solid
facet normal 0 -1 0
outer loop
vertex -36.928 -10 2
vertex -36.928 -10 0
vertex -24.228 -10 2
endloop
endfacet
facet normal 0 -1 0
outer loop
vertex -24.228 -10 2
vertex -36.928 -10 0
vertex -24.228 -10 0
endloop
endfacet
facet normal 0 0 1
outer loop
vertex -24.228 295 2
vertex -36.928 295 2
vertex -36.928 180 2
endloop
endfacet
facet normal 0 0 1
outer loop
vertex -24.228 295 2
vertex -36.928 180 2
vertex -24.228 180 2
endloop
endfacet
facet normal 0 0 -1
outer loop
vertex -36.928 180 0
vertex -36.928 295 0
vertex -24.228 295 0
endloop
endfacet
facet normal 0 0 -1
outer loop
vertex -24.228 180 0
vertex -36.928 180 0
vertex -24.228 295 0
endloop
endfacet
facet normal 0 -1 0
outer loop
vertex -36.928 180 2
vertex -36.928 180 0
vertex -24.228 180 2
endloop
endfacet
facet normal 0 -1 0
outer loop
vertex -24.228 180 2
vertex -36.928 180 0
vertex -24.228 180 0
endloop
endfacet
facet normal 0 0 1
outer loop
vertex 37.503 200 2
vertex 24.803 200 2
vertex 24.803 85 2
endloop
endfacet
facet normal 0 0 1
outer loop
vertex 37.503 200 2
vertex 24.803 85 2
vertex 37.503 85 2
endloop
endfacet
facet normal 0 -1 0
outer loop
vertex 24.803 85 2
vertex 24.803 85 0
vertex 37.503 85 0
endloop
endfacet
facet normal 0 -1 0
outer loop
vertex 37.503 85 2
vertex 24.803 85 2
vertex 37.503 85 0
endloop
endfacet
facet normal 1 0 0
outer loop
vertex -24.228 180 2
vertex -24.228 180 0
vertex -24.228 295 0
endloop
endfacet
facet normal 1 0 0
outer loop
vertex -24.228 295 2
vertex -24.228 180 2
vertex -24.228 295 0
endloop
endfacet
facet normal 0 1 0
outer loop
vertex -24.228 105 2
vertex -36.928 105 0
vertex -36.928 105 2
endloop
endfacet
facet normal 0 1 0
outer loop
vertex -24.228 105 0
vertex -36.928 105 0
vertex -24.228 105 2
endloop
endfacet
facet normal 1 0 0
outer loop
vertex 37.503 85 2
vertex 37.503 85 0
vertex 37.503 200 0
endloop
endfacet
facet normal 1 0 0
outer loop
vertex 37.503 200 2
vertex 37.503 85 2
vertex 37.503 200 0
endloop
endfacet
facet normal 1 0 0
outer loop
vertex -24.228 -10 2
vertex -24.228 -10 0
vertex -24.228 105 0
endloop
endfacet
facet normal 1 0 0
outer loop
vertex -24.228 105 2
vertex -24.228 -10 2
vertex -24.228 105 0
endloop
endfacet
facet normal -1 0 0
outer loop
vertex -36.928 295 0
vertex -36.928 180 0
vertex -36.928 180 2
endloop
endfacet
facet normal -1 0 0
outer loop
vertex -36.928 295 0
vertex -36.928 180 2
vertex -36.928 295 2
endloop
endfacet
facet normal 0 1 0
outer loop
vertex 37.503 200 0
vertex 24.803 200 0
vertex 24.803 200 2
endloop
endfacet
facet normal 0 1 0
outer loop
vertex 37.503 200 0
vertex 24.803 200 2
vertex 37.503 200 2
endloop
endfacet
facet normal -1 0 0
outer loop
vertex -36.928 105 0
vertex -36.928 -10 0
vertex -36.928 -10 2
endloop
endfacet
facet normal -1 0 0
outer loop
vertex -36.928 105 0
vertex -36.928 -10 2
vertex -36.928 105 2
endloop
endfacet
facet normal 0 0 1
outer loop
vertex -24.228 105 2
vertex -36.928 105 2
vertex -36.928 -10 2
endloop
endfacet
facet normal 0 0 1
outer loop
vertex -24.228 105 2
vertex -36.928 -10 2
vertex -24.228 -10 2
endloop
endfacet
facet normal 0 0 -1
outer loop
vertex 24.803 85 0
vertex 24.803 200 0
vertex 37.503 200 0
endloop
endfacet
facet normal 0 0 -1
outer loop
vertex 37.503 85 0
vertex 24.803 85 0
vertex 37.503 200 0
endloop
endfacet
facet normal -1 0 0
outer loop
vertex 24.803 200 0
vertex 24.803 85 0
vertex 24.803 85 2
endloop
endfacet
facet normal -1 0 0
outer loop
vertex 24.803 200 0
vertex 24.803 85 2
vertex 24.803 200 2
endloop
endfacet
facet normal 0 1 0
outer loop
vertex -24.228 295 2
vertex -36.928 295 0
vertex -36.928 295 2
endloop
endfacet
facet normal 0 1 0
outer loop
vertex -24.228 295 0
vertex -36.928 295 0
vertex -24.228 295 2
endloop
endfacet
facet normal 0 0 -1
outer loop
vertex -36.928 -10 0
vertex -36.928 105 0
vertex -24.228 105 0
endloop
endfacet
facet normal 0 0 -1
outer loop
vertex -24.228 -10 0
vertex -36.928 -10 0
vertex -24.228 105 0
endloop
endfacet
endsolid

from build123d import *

# Parameters (mm, degrees)
SKETCH1_W             = 12.7
SKETCH1_H             = 115
BOSS_EXTRUDE1_DEPTH   = 2
BOSS_EXTRUDE1_2_DEPTH = 2
BOSS_EXTRUDE1_3_DEPTH = 2


with BuildPart() as part:
    # Sketch1 → Boss-Extrude1 (new body)
    with BuildSketch(Plane.XY):
        with Locations((-30.578112918, 47.5)):
            Rectangle(SKETCH1_W, SKETCH1_H)
    extrude(amount=BOSS_EXTRUDE1_DEPTH)


with BuildPart() as body_2:
    # Sketch1 → Boss-Extrude1 2 (new body)
    with BuildSketch(Plane.XY):
        with Locations((31.153379131, 142.5)):
            Rectangle(SKETCH1_W, SKETCH1_H)
    extrude(amount=BOSS_EXTRUDE1_2_DEPTH)


with BuildPart() as body_3:
    # Sketch1 → Boss-Extrude1 3 (new body)
    with BuildSketch(Plane.XY):
        with Locations((-30.578112918, 237.5)):
            Rectangle(SKETCH1_W, SKETCH1_H)
    extrude(amount=BOSS_EXTRUDE1_3_DEPTH)


solid = Compound([part.part, body_2.part, body_3.part])
